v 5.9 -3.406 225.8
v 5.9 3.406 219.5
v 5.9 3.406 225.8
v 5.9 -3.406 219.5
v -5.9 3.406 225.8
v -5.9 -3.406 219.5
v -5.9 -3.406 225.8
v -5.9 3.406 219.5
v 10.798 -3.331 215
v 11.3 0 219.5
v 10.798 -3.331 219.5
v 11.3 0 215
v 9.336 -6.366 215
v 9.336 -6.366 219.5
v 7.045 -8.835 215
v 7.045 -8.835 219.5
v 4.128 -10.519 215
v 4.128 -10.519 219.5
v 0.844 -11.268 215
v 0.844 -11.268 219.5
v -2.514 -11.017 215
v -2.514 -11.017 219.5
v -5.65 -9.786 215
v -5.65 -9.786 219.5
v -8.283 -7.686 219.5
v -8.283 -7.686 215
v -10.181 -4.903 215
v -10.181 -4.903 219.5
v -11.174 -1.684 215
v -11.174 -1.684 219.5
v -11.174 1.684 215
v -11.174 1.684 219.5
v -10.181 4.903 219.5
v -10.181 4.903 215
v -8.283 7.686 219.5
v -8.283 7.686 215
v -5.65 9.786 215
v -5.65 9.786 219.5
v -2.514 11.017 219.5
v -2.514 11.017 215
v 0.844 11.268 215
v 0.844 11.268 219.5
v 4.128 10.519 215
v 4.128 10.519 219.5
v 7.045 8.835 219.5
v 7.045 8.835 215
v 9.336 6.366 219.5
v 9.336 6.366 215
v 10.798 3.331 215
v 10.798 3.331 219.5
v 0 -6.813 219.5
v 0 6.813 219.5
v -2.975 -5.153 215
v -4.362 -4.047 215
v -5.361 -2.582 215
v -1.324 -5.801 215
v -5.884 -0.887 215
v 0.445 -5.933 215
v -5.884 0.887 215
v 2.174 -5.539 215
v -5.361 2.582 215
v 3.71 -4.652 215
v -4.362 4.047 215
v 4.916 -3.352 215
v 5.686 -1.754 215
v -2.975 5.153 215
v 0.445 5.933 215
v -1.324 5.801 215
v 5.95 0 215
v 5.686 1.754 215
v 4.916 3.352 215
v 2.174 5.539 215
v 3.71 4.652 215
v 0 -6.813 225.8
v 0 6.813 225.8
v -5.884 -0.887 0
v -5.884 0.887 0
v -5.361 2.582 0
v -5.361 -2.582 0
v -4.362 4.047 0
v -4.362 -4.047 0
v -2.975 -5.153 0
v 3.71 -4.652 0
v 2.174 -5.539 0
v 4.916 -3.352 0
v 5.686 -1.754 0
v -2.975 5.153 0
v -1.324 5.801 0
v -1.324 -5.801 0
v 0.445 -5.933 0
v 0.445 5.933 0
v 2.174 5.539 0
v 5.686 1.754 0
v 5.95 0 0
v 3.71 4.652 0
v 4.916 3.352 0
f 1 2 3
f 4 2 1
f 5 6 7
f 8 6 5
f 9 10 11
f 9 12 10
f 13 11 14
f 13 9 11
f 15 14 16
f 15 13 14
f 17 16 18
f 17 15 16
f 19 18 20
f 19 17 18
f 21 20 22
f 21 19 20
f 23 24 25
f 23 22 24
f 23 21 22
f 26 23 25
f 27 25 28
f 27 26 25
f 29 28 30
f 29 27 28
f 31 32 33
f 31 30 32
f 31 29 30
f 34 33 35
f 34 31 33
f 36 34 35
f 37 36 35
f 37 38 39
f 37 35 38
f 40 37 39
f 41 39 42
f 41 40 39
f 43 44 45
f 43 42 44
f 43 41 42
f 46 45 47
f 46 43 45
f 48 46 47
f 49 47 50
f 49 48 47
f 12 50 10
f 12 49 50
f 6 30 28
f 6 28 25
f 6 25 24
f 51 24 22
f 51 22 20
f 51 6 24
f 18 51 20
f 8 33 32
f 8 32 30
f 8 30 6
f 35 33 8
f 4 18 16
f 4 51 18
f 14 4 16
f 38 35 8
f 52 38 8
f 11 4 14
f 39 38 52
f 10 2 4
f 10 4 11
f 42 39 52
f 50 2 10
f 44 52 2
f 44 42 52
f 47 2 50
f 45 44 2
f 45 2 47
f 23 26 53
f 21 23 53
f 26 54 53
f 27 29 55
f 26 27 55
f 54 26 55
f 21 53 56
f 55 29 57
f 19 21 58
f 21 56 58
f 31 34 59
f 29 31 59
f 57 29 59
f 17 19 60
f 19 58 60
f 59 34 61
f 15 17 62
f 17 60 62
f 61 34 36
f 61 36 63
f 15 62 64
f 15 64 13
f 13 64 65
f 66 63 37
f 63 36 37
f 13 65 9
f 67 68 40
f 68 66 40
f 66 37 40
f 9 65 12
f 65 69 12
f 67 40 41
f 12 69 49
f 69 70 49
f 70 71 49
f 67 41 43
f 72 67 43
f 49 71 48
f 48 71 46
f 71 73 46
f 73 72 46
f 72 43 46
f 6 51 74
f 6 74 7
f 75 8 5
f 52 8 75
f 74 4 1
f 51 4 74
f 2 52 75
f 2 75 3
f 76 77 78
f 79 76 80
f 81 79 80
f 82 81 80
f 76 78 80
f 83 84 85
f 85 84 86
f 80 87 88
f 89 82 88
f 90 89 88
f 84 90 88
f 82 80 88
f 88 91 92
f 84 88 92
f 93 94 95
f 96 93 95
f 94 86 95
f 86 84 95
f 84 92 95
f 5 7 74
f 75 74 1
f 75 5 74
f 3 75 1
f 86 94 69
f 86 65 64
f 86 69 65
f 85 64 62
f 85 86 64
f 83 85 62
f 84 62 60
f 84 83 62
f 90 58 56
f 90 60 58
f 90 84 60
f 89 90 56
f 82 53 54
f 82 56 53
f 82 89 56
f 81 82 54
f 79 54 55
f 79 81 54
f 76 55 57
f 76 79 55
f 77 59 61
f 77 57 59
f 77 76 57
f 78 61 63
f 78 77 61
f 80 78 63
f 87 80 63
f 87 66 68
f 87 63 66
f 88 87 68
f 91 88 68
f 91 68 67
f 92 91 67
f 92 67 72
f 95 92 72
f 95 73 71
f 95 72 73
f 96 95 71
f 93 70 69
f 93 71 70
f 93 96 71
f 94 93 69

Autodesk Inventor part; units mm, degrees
ref_plane "YZ Plane" through (0, 0, 0) normal (1, 0, 0) x (0, 1, 0)
ref_plane "XZ Plane" through (0, 0, 0) normal (0, 1, 0) x (-1, 0, 0)
ref_plane "XY Plane" through (0, 0, 0) normal (0, 0, 1) x (1, 0, 0)
sketch "スケッチ1" plane through (0, 0, 0) normal (0, 0, 1) x (1, 0, 0)
  circle A0 centre (0, 0) radius 5.95
  dimension "d0" = 11.9
extrude "押し出し1" add sketch "スケッチ1" along normal blind 215
thread "ねじ1" size "M12x1.75" class "6g" standard "ANSI Metric M Profile" length 22
sketch "スケッチ2" plane through (0, 0, 215) normal (0, 0, 1) x (1, 0, 0)
  circle A0 centre (0, 0) radius 11.3
  dimension "d5" = 22.6
extrude "押し出し2" add sketch "スケッチ2" along normal blind 4.5
sketch "スケッチ3" plane through (0, 0, 219.5) normal (0, 0, 1) x (1, 0, 0)
  circle A0 centre (0, 0) radius 5.9 construction
  line L0 (5.9, -3.4064) -> (0, -6.8127)
  line L1 (0, -6.8127) -> (-5.9, -3.4064)
  line L2 (-5.9, -3.4064) -> (-5.9, 3.4064)
  line L3 (-5.9, 3.4064) -> (0, 6.8127)
  line L4 (0, 6.8127) -> (5.9, 3.4064)
  line L5 (5.9, 3.4064) -> (5.9, -3.4064)
  point P0 (5.9, 0)
  dimension "d8" = 11.8
extrude "押し出し3" add sketch "スケッチ3" along normal blind 6.3
properties part number "後輪シャフト"
